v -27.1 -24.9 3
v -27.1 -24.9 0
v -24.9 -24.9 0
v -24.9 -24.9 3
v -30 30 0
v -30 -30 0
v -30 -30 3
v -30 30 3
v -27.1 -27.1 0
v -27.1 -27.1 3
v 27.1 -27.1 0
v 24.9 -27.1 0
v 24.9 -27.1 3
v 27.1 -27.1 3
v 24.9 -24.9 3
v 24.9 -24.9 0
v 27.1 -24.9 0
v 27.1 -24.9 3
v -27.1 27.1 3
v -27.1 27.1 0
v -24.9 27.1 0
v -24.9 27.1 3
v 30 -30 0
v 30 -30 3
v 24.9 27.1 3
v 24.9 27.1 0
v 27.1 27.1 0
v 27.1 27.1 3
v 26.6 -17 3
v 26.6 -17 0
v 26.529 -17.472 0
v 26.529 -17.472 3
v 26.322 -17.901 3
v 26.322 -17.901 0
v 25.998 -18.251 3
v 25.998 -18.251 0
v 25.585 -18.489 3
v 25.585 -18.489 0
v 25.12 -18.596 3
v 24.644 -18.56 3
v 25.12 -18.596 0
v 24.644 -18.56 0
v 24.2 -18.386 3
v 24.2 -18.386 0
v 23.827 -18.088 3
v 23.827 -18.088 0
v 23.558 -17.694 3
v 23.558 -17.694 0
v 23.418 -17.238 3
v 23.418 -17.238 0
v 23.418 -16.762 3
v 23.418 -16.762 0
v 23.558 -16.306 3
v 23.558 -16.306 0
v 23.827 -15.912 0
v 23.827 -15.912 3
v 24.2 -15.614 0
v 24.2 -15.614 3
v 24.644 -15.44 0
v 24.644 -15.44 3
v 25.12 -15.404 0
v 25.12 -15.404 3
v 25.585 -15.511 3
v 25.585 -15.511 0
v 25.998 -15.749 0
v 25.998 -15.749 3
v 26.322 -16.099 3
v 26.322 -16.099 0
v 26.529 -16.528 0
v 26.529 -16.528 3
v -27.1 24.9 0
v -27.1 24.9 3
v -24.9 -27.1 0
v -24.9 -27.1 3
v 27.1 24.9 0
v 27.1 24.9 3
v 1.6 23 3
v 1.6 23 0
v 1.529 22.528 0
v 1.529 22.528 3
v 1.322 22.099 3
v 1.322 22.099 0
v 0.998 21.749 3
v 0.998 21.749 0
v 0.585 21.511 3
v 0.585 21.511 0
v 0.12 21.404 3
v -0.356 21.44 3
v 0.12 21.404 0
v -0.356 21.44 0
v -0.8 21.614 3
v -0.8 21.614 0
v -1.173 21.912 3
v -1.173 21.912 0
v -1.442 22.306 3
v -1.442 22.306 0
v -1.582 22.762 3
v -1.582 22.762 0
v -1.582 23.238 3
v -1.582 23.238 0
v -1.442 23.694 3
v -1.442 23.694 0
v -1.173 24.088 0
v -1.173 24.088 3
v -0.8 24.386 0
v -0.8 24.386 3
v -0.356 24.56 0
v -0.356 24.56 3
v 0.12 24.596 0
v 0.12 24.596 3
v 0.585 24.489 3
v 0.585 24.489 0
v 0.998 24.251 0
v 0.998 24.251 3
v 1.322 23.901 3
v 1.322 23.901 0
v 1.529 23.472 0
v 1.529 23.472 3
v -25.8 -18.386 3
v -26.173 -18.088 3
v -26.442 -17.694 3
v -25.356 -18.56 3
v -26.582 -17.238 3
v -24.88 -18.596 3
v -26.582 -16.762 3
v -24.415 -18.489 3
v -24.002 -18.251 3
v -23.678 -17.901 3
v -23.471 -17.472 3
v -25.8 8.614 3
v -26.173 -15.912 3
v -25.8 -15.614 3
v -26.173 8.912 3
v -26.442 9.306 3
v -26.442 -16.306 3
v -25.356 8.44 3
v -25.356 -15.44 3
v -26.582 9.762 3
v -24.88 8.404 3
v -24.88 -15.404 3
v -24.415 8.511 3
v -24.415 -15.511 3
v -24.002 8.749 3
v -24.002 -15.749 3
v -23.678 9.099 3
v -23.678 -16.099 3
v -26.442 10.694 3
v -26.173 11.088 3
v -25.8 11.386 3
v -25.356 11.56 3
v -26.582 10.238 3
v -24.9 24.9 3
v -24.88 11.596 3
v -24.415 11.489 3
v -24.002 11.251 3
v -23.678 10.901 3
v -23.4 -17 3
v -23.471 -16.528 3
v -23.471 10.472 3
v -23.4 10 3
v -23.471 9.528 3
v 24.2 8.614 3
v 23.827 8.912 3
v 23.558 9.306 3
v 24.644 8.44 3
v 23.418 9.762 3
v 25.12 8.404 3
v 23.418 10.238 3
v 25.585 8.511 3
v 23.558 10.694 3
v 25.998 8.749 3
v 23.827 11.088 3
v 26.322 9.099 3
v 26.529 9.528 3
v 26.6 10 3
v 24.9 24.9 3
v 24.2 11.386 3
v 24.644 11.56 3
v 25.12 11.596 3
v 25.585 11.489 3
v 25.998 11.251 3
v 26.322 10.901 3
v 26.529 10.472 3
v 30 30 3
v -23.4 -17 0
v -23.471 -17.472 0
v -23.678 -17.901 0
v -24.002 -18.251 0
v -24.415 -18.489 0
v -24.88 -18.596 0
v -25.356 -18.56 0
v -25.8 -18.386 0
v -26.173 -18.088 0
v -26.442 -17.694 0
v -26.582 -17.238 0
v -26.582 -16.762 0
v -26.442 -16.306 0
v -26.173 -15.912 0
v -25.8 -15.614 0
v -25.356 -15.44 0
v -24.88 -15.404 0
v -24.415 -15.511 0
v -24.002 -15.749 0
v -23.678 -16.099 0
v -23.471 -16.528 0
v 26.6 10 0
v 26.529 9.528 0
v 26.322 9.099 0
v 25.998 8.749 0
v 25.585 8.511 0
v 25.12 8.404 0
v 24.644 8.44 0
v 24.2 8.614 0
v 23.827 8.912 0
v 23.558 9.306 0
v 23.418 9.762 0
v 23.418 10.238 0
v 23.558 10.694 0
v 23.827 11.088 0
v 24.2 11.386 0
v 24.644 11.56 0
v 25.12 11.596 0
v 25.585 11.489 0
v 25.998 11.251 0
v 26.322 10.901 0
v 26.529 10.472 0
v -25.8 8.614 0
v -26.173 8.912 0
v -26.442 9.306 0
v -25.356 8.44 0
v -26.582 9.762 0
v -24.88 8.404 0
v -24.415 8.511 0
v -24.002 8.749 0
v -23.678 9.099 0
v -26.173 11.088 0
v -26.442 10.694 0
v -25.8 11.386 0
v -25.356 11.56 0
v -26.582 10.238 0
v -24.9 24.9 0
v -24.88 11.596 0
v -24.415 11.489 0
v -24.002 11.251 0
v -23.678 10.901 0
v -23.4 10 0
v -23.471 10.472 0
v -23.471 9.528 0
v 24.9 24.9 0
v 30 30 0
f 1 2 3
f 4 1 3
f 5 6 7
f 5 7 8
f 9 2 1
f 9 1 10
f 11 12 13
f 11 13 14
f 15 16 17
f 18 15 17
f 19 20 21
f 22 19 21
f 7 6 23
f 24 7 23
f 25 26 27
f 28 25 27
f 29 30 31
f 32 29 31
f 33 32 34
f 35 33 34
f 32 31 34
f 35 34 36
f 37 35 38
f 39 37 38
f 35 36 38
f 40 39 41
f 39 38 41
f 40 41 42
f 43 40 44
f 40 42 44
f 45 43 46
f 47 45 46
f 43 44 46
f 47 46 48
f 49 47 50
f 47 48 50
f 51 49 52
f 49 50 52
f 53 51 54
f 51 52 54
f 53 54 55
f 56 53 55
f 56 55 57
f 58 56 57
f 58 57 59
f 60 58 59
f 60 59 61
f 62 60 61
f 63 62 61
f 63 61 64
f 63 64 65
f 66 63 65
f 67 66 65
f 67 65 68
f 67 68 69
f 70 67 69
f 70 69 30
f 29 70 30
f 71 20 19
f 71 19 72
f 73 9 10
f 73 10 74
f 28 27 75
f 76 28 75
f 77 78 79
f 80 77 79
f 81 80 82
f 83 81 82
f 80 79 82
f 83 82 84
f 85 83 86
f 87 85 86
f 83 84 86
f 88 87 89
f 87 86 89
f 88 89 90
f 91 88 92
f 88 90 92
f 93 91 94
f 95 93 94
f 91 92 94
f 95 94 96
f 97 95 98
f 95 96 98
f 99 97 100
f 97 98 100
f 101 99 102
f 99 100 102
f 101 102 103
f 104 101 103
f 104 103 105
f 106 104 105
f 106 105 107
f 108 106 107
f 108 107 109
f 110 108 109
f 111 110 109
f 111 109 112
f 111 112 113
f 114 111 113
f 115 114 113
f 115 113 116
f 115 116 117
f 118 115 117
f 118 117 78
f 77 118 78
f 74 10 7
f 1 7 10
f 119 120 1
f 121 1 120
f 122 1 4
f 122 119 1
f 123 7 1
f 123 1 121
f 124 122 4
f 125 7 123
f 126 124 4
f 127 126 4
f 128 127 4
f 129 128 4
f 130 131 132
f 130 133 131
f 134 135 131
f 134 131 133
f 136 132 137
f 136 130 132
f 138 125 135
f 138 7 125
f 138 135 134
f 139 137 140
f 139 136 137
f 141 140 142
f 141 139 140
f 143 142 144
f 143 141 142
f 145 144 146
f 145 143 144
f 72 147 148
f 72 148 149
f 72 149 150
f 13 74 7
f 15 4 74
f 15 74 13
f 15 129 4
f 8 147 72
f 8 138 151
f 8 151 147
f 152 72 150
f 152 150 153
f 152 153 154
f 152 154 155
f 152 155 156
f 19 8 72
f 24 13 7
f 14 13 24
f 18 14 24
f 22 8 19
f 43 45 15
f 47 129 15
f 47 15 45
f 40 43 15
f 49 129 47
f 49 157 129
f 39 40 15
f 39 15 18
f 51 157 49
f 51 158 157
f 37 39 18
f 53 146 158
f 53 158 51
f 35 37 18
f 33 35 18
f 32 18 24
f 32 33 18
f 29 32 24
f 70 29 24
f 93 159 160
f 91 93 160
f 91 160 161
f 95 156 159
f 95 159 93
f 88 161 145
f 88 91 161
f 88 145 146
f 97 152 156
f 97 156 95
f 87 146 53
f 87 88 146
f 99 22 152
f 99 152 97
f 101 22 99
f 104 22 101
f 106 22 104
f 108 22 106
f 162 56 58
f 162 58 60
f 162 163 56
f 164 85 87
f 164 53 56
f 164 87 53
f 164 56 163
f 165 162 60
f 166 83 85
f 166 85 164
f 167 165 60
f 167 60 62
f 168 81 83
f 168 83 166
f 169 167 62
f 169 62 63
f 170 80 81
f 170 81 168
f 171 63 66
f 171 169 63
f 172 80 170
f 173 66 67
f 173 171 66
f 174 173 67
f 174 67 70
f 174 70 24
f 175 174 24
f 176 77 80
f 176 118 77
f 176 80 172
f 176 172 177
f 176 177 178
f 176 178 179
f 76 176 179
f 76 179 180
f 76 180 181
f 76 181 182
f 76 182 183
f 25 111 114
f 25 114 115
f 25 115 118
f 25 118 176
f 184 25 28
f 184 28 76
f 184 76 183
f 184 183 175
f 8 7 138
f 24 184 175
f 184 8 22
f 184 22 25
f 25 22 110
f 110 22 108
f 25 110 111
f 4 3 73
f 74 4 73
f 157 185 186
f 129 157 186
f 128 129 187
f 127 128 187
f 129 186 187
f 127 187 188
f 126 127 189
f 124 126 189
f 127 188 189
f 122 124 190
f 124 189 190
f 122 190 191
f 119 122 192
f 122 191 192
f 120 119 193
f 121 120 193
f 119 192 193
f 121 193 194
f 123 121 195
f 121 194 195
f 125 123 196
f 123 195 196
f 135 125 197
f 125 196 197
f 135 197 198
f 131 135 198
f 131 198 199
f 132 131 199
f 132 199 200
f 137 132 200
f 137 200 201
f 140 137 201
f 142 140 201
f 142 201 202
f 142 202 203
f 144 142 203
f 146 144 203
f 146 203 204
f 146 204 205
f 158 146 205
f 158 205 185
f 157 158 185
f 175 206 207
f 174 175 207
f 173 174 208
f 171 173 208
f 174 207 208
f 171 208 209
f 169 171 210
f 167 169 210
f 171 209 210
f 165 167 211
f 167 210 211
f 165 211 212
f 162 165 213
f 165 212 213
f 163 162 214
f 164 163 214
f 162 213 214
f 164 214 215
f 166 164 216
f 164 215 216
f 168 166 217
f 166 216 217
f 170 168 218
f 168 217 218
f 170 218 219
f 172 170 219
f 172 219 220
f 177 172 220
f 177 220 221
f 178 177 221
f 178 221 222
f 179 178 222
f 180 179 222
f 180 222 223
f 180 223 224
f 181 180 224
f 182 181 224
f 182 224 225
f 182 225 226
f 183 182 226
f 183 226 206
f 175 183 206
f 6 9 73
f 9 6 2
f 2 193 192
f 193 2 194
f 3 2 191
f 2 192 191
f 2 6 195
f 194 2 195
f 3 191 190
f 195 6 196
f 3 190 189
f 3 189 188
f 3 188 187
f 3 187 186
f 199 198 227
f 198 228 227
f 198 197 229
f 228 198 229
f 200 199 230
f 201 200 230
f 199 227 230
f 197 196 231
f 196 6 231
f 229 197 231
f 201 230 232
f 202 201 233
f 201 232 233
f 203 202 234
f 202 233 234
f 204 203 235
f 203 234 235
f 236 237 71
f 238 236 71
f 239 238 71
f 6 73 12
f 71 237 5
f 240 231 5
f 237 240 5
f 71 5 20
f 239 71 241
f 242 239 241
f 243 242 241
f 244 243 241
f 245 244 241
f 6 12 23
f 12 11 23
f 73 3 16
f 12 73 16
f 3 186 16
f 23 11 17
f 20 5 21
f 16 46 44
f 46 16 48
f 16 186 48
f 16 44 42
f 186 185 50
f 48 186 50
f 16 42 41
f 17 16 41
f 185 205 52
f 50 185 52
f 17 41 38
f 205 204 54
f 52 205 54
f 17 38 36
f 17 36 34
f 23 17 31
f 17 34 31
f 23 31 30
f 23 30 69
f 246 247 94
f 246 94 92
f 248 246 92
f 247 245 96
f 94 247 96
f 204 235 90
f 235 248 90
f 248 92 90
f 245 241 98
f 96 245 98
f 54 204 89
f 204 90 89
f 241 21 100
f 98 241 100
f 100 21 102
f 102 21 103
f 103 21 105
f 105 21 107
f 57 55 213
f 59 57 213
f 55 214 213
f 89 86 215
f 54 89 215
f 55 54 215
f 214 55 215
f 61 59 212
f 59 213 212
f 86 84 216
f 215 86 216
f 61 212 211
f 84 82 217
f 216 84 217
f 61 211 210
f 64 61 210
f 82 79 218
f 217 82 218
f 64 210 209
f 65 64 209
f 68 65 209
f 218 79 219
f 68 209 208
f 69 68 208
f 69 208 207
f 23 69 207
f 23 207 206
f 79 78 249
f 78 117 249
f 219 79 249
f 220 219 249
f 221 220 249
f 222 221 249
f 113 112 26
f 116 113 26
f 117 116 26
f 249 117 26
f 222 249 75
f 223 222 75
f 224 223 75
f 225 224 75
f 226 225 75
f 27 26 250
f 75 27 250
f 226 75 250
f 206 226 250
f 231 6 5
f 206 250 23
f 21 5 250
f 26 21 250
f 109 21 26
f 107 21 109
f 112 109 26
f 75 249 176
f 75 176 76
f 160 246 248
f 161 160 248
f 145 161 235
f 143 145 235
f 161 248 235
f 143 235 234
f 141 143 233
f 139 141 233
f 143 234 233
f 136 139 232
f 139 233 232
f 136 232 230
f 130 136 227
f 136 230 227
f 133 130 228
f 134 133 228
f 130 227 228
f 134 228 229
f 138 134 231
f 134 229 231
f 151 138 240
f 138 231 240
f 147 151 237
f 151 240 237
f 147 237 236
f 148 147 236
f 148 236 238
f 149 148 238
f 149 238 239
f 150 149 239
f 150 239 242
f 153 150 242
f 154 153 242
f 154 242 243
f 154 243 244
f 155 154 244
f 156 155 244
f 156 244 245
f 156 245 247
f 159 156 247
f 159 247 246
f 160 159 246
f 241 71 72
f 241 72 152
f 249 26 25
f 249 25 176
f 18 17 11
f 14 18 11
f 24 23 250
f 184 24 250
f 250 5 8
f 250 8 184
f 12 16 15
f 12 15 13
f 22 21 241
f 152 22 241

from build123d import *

# Parameters (mm, degrees)
F0_W     = 60
F0_H     = 60
F1_DEPTH = 3
F2_R     = 1.6
F3_DEPTH = 3.001
F4_W     = 2.2
F4_H     = 2.2
F5_DEPTH = 3.001


with BuildPart() as f1:
    # F0 (on Top) → F1 (new body)
    with BuildSketch(Plane.XY):
        Rectangle(F0_W, F0_H)
    extrude(amount=F1_DEPTH)

    # F2 (on face) → F3 (cut, through all)
    with BuildSketch(Plane(origin=(0, 0, 0), x_dir=(1, 0, 0), z_dir=(0, 0, -1))):
        with Locations((-25, -10)):
            Circle(F2_R)
        with Locations((-25, 17)):
            Circle(F2_R)
        with Locations((25, 17)):
            Circle(F2_R)
        with Locations((25, -10)):
            Circle(F2_R)
        with Locations((0, -23)):
            Circle(F2_R)
    extrude(amount=-F3_DEPTH, mode=Mode.SUBTRACT)

    # F4 (on face) → F5 (cut, through all)
    with BuildSketch(Plane(origin=(0, 0, 0), x_dir=(1, 0, 0), z_dir=(0, 0, -1))):
        with Locations((26, 26)):
            Rectangle(F4_W, F4_H)
        with Locations((26, -26)):
            Rectangle(F4_W, F4_H)
        with Locations((-26, 26)):
            Rectangle(F4_W, F4_H)
        with Locations((-26, -26)):
            Rectangle(F4_W, F4_H)
    extrude(amount=-F5_DEPTH, mode=Mode.SUBTRACT)


solid = f1.part
